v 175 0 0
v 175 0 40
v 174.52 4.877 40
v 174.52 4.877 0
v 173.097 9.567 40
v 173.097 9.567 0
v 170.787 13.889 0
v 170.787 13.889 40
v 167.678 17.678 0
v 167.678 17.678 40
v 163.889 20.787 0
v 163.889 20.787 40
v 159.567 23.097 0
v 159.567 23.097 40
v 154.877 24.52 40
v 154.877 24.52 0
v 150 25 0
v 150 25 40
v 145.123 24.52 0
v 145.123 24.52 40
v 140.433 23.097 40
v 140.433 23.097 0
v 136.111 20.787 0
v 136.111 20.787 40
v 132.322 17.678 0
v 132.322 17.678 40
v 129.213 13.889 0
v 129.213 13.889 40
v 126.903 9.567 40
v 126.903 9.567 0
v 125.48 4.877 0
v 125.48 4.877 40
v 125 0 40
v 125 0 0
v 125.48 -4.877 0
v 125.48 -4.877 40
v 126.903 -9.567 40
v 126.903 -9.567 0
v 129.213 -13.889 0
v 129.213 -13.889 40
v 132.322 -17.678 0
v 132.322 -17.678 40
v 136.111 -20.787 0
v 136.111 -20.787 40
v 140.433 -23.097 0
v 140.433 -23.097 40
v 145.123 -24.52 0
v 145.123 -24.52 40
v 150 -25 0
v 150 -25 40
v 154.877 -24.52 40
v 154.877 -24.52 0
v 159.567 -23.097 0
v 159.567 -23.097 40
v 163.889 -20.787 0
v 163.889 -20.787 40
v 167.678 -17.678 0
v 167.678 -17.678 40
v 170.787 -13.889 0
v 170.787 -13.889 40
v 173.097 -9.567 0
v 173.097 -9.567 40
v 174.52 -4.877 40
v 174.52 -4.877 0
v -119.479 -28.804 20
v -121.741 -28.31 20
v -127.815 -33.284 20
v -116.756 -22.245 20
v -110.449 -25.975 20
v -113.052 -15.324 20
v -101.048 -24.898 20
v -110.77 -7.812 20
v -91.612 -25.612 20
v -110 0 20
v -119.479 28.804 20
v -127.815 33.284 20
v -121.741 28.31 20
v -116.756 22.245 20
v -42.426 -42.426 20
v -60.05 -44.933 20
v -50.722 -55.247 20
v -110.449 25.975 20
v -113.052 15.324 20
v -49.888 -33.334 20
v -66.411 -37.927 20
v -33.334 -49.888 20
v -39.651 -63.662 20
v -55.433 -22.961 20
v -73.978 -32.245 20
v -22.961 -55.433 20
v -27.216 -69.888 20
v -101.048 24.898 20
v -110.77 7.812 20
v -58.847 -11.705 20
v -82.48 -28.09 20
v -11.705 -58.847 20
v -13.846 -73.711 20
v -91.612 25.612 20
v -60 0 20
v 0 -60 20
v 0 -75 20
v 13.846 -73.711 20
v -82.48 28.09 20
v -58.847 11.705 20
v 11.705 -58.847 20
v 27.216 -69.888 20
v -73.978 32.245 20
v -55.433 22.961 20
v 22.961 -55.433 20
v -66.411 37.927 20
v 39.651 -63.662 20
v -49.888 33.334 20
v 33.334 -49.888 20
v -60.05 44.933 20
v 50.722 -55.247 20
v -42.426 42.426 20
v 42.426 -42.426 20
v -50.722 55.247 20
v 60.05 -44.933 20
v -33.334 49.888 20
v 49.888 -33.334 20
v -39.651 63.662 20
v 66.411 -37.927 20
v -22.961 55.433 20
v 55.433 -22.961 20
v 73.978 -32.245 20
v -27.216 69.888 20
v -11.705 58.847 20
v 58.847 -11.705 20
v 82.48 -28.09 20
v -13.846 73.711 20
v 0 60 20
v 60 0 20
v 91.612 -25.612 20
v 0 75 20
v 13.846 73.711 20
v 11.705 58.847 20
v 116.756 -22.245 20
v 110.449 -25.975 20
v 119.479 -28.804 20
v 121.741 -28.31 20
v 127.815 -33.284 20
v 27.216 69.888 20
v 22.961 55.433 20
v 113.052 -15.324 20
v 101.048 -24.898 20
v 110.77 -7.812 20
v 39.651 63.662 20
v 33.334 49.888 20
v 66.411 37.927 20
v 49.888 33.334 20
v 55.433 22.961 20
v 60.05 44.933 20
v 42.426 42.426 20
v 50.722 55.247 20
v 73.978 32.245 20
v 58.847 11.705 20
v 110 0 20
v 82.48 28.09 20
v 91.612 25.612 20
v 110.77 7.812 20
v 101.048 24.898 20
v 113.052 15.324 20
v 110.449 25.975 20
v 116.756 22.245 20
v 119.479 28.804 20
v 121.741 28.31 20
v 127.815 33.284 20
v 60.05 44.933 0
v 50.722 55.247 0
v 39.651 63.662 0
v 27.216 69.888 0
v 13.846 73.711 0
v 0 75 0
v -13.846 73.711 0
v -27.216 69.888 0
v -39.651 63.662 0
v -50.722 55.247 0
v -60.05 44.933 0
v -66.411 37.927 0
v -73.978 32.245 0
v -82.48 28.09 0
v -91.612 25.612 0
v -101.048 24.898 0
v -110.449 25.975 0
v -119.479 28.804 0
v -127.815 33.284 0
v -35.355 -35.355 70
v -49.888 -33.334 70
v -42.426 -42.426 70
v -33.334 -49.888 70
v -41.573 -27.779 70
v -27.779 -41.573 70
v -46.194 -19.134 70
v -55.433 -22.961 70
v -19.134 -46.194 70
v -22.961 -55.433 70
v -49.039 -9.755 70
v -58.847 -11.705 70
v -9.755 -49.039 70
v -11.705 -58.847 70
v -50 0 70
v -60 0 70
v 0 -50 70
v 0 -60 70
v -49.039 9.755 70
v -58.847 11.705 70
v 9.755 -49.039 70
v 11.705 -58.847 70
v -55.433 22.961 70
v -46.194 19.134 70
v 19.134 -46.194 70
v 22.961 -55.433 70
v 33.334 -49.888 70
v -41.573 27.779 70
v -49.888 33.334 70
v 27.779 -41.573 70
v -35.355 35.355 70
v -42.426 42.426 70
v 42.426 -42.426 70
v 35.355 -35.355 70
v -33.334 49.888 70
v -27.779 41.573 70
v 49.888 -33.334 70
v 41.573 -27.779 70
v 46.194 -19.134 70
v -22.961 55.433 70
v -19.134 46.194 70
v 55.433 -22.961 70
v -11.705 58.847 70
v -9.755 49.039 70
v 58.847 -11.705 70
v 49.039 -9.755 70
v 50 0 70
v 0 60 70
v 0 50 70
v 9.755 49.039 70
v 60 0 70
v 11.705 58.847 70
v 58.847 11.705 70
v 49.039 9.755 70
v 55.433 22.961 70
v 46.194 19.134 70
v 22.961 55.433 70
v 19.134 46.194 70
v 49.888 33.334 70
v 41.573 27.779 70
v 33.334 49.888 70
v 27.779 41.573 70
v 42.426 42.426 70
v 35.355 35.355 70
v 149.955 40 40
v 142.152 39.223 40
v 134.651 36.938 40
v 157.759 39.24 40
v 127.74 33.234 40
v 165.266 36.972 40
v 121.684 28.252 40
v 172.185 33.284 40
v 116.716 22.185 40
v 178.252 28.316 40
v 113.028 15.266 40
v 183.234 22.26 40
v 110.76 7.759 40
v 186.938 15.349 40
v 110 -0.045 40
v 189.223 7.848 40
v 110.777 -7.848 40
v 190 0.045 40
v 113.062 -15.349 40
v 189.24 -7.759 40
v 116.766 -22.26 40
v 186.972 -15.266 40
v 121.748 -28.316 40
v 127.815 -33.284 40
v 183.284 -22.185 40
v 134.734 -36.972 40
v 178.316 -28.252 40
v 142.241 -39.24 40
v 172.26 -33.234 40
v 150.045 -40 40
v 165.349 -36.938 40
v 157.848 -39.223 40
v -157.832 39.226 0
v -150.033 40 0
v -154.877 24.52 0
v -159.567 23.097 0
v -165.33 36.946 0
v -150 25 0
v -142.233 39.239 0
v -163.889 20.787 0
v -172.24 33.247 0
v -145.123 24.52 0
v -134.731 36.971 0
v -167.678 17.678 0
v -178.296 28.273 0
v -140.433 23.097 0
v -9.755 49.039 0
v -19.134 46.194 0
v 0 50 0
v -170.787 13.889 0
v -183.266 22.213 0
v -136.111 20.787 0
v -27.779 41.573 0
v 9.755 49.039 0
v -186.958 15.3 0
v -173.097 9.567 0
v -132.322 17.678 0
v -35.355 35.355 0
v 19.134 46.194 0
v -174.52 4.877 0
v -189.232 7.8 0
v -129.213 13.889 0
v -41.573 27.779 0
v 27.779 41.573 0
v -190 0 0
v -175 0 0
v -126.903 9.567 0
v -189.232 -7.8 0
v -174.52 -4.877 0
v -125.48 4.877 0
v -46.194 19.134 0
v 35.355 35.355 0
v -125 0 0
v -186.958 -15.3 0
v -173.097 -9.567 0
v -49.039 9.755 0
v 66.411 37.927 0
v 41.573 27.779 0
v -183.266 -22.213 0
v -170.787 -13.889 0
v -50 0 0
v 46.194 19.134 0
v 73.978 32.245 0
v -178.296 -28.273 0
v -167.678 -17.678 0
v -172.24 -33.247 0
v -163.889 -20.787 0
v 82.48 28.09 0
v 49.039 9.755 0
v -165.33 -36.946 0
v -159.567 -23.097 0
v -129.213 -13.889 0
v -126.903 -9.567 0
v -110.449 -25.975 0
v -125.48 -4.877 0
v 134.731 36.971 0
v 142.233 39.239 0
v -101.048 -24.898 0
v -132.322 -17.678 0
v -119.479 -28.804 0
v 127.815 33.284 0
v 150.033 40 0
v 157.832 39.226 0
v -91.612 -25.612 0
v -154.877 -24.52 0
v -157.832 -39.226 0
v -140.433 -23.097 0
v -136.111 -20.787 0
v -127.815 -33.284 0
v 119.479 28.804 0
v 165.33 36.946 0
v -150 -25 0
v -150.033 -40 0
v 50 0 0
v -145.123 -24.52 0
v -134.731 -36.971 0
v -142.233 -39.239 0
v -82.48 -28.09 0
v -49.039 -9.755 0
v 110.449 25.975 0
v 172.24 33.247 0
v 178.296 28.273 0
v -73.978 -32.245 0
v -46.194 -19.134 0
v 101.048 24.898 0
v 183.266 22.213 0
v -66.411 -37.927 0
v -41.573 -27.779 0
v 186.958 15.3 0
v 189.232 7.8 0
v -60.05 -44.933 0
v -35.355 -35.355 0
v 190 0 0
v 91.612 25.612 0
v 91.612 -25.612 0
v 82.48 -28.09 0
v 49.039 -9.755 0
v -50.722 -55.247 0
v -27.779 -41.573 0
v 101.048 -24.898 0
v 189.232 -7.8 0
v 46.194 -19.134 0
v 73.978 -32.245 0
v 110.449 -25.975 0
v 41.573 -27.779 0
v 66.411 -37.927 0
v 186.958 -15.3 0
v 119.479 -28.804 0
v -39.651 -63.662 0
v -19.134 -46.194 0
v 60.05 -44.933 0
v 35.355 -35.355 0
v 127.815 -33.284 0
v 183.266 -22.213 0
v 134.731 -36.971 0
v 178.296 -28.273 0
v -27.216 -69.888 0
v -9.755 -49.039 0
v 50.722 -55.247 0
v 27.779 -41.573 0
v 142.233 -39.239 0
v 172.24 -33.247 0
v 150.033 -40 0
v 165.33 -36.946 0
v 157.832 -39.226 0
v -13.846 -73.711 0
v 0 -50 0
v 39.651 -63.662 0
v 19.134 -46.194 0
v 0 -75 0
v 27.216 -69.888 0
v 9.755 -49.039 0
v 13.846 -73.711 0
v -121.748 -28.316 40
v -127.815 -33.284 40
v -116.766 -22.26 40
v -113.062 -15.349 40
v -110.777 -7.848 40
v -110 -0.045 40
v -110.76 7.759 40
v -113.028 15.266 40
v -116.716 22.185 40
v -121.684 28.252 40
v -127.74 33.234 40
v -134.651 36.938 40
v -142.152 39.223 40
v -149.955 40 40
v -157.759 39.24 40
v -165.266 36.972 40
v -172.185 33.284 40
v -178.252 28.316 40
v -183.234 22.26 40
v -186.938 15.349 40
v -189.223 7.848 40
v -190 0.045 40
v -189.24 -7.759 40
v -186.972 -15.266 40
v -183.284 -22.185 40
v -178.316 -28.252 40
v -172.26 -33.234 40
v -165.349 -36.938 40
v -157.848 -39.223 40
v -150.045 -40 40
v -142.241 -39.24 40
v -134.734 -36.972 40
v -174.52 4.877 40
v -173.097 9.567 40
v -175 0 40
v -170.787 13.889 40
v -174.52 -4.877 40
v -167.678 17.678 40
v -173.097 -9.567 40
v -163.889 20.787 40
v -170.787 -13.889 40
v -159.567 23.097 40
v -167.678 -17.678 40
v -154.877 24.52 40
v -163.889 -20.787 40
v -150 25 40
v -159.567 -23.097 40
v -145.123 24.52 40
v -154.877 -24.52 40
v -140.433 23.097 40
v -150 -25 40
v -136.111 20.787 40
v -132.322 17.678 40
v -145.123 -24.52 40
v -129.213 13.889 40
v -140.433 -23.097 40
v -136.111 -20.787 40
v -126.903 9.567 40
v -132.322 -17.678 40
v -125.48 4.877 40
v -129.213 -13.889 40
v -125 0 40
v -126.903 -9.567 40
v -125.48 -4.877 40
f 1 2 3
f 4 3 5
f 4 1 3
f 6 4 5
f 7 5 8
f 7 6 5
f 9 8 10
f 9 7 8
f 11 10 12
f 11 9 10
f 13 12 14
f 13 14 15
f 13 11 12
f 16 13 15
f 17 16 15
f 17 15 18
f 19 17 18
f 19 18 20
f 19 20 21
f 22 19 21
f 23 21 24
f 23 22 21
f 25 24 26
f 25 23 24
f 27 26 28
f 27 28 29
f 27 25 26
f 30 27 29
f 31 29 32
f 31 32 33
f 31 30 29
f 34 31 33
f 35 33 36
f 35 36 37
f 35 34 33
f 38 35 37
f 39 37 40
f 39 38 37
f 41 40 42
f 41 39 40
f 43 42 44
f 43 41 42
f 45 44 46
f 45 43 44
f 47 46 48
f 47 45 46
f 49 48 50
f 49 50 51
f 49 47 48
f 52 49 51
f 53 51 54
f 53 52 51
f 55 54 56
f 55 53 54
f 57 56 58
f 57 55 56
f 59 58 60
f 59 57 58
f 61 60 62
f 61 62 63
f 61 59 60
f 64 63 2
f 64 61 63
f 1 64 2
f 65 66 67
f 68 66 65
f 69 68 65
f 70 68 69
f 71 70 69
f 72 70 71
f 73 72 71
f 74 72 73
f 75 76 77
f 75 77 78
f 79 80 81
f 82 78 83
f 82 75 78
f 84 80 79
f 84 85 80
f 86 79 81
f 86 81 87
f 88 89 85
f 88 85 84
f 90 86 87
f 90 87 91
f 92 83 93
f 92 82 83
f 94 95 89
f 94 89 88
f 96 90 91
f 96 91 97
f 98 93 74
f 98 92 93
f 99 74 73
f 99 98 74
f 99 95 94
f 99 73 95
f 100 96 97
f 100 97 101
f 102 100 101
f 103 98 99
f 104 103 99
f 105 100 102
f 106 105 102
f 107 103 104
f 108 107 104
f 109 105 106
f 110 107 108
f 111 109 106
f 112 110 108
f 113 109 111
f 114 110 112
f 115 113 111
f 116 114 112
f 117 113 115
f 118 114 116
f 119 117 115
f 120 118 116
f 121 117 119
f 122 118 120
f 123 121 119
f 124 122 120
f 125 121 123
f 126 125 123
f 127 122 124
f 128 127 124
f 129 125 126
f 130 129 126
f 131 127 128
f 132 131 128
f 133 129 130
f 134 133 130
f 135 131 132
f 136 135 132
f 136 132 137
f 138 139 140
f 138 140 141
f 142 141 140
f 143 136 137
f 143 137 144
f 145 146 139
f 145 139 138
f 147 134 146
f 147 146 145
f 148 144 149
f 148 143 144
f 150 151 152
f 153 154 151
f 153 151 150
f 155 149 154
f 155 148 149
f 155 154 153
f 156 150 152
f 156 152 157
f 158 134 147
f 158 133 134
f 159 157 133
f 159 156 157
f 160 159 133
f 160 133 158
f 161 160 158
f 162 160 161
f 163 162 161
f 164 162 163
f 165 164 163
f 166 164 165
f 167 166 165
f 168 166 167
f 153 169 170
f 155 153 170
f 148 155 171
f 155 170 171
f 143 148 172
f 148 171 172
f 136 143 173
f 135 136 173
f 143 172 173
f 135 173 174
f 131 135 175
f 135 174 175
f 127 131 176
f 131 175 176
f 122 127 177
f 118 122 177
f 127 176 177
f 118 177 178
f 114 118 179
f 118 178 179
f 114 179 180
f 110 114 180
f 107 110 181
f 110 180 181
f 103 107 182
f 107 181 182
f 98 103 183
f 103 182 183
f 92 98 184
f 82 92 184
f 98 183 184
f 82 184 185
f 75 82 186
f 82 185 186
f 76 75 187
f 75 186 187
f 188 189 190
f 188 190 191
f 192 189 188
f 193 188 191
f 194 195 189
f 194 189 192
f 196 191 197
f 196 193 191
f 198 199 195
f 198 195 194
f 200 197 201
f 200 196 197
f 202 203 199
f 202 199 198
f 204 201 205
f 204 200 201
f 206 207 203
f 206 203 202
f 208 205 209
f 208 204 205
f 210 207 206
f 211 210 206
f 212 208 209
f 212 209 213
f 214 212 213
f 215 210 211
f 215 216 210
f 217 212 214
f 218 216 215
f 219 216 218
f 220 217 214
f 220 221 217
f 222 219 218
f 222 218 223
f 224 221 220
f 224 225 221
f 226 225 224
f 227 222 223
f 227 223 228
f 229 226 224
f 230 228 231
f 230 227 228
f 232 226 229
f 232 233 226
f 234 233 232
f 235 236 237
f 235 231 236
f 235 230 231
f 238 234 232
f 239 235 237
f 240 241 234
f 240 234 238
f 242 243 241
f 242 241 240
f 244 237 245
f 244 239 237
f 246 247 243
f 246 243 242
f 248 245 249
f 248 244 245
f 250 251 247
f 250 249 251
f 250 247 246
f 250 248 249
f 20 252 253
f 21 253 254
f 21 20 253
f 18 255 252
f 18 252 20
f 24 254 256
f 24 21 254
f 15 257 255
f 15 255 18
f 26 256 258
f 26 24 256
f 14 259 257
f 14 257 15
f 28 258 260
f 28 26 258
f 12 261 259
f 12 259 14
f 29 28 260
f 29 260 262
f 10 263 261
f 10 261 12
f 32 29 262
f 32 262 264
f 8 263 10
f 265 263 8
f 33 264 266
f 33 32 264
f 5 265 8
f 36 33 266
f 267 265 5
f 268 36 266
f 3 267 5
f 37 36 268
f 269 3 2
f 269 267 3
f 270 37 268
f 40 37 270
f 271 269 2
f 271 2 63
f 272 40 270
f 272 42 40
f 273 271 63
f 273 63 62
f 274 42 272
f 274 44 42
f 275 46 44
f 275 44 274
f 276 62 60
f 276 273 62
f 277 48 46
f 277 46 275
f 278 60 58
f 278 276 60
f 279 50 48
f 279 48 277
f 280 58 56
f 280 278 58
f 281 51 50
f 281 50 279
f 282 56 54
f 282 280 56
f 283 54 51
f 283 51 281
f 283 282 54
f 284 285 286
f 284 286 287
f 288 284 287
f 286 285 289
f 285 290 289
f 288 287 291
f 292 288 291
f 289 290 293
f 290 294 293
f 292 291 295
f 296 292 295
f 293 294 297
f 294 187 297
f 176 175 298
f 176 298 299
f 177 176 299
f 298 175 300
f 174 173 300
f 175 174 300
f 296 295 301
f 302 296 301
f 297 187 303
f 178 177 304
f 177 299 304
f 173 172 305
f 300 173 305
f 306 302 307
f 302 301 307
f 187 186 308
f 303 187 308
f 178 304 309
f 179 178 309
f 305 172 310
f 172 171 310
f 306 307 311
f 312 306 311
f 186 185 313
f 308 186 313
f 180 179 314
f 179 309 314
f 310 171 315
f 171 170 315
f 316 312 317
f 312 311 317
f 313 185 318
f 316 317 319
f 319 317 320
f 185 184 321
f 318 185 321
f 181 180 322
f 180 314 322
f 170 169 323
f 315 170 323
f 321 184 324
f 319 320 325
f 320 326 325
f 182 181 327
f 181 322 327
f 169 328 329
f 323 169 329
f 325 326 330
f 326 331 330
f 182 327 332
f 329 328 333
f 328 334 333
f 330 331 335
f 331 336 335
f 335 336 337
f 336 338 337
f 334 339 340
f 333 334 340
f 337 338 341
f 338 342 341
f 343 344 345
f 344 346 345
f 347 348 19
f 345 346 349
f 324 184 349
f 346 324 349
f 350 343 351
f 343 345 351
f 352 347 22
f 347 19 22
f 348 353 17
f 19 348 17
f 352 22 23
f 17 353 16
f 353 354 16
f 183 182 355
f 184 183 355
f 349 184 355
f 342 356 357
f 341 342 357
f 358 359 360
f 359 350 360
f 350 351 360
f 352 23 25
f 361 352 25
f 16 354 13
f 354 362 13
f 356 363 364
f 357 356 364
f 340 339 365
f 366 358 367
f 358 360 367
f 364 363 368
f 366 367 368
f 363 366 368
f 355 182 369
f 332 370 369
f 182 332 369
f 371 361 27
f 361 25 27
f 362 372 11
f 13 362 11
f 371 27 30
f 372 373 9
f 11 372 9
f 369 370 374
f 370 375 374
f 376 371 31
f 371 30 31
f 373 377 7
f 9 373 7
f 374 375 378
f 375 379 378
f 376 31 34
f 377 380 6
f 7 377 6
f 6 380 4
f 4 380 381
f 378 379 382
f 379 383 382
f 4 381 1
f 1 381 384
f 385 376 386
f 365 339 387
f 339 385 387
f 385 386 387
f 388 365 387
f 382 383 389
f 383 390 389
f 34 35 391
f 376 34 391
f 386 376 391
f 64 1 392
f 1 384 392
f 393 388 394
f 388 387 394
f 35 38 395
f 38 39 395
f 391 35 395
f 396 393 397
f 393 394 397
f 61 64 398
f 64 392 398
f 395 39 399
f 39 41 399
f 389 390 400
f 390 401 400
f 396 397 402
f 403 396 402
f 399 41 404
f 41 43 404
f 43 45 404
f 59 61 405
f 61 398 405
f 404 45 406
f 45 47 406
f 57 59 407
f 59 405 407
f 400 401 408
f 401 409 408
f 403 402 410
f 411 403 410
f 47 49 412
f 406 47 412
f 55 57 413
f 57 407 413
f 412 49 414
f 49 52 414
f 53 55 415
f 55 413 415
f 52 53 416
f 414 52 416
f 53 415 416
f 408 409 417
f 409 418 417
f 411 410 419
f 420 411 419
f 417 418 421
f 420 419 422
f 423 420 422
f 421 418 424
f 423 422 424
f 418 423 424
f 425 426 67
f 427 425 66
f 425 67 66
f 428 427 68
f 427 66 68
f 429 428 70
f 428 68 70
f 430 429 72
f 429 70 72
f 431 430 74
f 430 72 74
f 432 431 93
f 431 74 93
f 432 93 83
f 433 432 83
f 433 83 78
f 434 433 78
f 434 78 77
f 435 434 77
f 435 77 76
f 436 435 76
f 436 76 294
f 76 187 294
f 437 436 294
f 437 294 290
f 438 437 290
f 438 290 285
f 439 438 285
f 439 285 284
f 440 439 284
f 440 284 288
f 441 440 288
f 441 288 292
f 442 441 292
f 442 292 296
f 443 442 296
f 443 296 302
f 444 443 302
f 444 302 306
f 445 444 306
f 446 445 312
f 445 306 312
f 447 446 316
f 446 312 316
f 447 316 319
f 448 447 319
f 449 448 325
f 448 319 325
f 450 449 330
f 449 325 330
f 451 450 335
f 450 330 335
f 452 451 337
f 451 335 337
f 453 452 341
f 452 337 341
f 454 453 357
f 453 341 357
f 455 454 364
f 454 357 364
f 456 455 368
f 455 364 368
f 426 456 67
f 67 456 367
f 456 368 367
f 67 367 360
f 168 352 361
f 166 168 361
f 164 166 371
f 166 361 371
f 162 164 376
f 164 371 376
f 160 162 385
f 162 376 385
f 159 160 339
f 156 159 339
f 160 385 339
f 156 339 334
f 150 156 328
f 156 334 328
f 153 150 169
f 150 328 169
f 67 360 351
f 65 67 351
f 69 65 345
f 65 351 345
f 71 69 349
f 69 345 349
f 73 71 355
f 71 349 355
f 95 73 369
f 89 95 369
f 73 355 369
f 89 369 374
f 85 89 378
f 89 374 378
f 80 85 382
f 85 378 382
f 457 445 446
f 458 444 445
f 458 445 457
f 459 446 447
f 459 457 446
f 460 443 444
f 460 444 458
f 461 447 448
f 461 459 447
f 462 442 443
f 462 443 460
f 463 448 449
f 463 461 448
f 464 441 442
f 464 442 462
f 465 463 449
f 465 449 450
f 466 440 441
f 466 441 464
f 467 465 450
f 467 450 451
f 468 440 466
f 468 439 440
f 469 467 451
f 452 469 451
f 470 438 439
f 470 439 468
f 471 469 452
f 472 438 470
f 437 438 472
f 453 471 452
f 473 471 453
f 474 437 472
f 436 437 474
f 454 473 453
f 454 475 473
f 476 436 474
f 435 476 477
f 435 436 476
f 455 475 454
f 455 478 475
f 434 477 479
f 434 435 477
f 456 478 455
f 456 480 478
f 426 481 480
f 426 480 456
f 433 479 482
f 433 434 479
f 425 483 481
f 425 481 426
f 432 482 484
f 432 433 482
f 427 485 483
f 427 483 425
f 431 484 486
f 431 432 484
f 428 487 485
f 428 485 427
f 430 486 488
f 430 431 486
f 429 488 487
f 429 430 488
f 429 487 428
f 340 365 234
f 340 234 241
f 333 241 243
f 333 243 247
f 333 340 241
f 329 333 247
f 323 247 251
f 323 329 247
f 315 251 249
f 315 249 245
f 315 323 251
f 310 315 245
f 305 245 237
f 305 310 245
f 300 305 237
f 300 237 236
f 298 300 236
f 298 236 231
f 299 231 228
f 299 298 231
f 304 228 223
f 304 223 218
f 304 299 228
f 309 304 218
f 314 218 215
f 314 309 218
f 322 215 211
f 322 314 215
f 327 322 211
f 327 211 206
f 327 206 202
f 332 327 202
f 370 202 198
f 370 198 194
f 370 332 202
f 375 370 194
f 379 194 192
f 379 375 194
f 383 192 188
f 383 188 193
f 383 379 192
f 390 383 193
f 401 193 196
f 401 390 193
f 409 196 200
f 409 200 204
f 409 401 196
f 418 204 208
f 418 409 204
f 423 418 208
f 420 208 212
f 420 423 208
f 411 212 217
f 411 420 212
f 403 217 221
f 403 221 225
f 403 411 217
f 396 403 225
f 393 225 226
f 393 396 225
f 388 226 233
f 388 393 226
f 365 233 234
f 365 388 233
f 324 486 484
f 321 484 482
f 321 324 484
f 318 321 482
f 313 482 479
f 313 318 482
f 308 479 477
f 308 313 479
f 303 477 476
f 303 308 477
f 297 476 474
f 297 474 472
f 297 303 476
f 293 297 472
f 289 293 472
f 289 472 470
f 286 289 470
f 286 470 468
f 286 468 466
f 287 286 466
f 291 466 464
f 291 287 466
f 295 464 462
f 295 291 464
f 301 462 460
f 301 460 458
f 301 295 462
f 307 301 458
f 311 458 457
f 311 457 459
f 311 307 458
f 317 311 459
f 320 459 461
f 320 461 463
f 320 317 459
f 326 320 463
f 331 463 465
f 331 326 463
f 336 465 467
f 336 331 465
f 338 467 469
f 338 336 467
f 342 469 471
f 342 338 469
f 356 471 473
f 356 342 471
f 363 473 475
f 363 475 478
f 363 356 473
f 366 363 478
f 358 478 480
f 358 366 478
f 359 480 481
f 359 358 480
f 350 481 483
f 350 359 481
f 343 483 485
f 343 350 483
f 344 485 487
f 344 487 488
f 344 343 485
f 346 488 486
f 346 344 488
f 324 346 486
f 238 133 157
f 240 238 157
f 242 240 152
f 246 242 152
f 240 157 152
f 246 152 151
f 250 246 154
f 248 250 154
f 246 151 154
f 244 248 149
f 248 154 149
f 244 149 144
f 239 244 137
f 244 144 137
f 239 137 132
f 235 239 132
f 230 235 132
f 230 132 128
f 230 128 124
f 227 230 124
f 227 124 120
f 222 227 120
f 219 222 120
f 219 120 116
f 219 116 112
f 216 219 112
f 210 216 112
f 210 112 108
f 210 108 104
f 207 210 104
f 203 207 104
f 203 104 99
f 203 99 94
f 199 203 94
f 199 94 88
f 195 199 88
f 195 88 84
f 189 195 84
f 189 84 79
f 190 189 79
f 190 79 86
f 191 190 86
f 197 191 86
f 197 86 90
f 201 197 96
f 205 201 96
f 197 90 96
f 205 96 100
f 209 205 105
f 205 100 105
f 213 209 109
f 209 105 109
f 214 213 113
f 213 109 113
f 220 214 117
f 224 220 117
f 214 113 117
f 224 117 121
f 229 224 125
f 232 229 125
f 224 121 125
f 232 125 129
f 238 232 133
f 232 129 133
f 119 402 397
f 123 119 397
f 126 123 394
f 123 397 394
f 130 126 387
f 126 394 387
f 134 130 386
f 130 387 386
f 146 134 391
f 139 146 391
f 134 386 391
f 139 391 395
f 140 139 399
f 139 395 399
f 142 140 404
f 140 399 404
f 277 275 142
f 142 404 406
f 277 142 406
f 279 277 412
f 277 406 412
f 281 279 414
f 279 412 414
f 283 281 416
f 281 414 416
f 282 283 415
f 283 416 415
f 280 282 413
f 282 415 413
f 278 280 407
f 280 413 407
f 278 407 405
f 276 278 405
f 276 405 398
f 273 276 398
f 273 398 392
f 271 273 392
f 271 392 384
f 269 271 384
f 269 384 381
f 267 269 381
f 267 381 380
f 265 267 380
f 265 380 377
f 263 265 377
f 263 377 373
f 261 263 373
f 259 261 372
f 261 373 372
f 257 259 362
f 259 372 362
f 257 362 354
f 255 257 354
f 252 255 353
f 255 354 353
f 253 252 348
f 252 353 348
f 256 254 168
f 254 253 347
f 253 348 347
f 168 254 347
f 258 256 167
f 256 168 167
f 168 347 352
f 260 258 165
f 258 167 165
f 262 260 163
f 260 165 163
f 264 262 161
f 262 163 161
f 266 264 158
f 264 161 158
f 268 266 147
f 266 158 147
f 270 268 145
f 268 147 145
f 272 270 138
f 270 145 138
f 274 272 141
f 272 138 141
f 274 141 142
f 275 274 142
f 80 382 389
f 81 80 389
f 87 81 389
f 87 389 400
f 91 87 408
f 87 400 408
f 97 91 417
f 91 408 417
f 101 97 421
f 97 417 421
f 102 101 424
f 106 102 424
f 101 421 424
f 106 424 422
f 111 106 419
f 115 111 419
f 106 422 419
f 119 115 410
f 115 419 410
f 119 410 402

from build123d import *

# Parameters (mm, degrees)
SKETCH1_R           = 60
BOSS_EXTRUDE4_DEPTH = 20
SKETCH1_5_R         = 25
BOSS_EXTRUDE5_DEPTH = 40
SKETCH1_6_R         = 25
BOSS_EXTRUDE6_DEPTH = 40
SKETCH1_7_R         = 60
SKETCH1_7_R_2       = 50
BOSS_EXTRUDE7_DEPTH = 70


with BuildPart() as part:
    # Sketch1 → Boss-Extrude4 (new body)
    with BuildSketch(Plane.XY):
        with BuildLine():
            ThreePointArc((-60.05, -44.933256058), (0, -75), (60.05, -44.933256058))
            ThreePointArc((60.05, -44.933256058), (91.612158535, -25.611592996), (127.814814815, -33.283893377))
            ThreePointArc((127.814814815, -33.283893377), (110, 0), (127.814814815, 33.283893377))
            ThreePointArc((127.814814815, 33.283893377), (91.612158535, 25.611592996), (60.05, 44.933256058))
            ThreePointArc((60.05, 44.933256058), (0, 75), (-60.05, 44.933256058))
            ThreePointArc((-60.05, 44.933256058), (-91.612158535, 25.611592996), (-127.814814815, 33.283893377))
            ThreePointArc((-127.814814815, 33.283893377), (-110, 0), (-127.814814815, -33.283893377))
            ThreePointArc((-127.814814815, -33.283893377), (-91.612158535, -25.611592996), (-60.05, -44.933256058))
        make_face()
        Circle(SKETCH1_R, mode=Mode.SUBTRACT)
    extrude(amount=BOSS_EXTRUDE4_DEPTH)

    # Sketch1<5> → Boss-Extrude5 (add)
    with BuildSketch(Plane.XY):
        with BuildLine():
            ThreePointArc((-110, 0), (-114.733816428, 18.875812467), (-127.814814815, 33.283893377))
            ThreePointArc((-127.814814815, 33.283893377), (-190, 0), (-127.814814815, -33.283893377))
            ThreePointArc((-127.814814815, -33.283893377), (-114.733816428, -18.875812467), (-110, 0))
        make_face()
        with Locations((-150, 0)):
            Circle(SKETCH1_5_R, mode=Mode.SUBTRACT)
    extrude(amount=BOSS_EXTRUDE5_DEPTH)

    # Sketch1<6> → Boss-Extrude6 (add)
    with BuildSketch(Plane.XY):
        with BuildLine():
            ThreePointArc((190, 0), (168.875812467, 35.266183572), (127.814814815, 33.283893377))
            ThreePointArc((127.814814815, 33.283893377), (110, 0), (127.814814815, -33.283893377))
            ThreePointArc((127.814814815, -33.283893377), (168.875812467, -35.266183572), (190, 0))
        make_face()
        with Locations((150, 0)):
            Circle(SKETCH1_6_R, mode=Mode.SUBTRACT)
    extrude(amount=BOSS_EXTRUDE6_DEPTH)

    # Sketch1<7> → Boss-Extrude7 (add)
    with BuildSketch(Plane.XY):
        Circle(SKETCH1_7_R)
        Circle(SKETCH1_7_R_2, mode=Mode.SUBTRACT)
    extrude(amount=BOSS_EXTRUDE7_DEPTH)


solid = part.part
